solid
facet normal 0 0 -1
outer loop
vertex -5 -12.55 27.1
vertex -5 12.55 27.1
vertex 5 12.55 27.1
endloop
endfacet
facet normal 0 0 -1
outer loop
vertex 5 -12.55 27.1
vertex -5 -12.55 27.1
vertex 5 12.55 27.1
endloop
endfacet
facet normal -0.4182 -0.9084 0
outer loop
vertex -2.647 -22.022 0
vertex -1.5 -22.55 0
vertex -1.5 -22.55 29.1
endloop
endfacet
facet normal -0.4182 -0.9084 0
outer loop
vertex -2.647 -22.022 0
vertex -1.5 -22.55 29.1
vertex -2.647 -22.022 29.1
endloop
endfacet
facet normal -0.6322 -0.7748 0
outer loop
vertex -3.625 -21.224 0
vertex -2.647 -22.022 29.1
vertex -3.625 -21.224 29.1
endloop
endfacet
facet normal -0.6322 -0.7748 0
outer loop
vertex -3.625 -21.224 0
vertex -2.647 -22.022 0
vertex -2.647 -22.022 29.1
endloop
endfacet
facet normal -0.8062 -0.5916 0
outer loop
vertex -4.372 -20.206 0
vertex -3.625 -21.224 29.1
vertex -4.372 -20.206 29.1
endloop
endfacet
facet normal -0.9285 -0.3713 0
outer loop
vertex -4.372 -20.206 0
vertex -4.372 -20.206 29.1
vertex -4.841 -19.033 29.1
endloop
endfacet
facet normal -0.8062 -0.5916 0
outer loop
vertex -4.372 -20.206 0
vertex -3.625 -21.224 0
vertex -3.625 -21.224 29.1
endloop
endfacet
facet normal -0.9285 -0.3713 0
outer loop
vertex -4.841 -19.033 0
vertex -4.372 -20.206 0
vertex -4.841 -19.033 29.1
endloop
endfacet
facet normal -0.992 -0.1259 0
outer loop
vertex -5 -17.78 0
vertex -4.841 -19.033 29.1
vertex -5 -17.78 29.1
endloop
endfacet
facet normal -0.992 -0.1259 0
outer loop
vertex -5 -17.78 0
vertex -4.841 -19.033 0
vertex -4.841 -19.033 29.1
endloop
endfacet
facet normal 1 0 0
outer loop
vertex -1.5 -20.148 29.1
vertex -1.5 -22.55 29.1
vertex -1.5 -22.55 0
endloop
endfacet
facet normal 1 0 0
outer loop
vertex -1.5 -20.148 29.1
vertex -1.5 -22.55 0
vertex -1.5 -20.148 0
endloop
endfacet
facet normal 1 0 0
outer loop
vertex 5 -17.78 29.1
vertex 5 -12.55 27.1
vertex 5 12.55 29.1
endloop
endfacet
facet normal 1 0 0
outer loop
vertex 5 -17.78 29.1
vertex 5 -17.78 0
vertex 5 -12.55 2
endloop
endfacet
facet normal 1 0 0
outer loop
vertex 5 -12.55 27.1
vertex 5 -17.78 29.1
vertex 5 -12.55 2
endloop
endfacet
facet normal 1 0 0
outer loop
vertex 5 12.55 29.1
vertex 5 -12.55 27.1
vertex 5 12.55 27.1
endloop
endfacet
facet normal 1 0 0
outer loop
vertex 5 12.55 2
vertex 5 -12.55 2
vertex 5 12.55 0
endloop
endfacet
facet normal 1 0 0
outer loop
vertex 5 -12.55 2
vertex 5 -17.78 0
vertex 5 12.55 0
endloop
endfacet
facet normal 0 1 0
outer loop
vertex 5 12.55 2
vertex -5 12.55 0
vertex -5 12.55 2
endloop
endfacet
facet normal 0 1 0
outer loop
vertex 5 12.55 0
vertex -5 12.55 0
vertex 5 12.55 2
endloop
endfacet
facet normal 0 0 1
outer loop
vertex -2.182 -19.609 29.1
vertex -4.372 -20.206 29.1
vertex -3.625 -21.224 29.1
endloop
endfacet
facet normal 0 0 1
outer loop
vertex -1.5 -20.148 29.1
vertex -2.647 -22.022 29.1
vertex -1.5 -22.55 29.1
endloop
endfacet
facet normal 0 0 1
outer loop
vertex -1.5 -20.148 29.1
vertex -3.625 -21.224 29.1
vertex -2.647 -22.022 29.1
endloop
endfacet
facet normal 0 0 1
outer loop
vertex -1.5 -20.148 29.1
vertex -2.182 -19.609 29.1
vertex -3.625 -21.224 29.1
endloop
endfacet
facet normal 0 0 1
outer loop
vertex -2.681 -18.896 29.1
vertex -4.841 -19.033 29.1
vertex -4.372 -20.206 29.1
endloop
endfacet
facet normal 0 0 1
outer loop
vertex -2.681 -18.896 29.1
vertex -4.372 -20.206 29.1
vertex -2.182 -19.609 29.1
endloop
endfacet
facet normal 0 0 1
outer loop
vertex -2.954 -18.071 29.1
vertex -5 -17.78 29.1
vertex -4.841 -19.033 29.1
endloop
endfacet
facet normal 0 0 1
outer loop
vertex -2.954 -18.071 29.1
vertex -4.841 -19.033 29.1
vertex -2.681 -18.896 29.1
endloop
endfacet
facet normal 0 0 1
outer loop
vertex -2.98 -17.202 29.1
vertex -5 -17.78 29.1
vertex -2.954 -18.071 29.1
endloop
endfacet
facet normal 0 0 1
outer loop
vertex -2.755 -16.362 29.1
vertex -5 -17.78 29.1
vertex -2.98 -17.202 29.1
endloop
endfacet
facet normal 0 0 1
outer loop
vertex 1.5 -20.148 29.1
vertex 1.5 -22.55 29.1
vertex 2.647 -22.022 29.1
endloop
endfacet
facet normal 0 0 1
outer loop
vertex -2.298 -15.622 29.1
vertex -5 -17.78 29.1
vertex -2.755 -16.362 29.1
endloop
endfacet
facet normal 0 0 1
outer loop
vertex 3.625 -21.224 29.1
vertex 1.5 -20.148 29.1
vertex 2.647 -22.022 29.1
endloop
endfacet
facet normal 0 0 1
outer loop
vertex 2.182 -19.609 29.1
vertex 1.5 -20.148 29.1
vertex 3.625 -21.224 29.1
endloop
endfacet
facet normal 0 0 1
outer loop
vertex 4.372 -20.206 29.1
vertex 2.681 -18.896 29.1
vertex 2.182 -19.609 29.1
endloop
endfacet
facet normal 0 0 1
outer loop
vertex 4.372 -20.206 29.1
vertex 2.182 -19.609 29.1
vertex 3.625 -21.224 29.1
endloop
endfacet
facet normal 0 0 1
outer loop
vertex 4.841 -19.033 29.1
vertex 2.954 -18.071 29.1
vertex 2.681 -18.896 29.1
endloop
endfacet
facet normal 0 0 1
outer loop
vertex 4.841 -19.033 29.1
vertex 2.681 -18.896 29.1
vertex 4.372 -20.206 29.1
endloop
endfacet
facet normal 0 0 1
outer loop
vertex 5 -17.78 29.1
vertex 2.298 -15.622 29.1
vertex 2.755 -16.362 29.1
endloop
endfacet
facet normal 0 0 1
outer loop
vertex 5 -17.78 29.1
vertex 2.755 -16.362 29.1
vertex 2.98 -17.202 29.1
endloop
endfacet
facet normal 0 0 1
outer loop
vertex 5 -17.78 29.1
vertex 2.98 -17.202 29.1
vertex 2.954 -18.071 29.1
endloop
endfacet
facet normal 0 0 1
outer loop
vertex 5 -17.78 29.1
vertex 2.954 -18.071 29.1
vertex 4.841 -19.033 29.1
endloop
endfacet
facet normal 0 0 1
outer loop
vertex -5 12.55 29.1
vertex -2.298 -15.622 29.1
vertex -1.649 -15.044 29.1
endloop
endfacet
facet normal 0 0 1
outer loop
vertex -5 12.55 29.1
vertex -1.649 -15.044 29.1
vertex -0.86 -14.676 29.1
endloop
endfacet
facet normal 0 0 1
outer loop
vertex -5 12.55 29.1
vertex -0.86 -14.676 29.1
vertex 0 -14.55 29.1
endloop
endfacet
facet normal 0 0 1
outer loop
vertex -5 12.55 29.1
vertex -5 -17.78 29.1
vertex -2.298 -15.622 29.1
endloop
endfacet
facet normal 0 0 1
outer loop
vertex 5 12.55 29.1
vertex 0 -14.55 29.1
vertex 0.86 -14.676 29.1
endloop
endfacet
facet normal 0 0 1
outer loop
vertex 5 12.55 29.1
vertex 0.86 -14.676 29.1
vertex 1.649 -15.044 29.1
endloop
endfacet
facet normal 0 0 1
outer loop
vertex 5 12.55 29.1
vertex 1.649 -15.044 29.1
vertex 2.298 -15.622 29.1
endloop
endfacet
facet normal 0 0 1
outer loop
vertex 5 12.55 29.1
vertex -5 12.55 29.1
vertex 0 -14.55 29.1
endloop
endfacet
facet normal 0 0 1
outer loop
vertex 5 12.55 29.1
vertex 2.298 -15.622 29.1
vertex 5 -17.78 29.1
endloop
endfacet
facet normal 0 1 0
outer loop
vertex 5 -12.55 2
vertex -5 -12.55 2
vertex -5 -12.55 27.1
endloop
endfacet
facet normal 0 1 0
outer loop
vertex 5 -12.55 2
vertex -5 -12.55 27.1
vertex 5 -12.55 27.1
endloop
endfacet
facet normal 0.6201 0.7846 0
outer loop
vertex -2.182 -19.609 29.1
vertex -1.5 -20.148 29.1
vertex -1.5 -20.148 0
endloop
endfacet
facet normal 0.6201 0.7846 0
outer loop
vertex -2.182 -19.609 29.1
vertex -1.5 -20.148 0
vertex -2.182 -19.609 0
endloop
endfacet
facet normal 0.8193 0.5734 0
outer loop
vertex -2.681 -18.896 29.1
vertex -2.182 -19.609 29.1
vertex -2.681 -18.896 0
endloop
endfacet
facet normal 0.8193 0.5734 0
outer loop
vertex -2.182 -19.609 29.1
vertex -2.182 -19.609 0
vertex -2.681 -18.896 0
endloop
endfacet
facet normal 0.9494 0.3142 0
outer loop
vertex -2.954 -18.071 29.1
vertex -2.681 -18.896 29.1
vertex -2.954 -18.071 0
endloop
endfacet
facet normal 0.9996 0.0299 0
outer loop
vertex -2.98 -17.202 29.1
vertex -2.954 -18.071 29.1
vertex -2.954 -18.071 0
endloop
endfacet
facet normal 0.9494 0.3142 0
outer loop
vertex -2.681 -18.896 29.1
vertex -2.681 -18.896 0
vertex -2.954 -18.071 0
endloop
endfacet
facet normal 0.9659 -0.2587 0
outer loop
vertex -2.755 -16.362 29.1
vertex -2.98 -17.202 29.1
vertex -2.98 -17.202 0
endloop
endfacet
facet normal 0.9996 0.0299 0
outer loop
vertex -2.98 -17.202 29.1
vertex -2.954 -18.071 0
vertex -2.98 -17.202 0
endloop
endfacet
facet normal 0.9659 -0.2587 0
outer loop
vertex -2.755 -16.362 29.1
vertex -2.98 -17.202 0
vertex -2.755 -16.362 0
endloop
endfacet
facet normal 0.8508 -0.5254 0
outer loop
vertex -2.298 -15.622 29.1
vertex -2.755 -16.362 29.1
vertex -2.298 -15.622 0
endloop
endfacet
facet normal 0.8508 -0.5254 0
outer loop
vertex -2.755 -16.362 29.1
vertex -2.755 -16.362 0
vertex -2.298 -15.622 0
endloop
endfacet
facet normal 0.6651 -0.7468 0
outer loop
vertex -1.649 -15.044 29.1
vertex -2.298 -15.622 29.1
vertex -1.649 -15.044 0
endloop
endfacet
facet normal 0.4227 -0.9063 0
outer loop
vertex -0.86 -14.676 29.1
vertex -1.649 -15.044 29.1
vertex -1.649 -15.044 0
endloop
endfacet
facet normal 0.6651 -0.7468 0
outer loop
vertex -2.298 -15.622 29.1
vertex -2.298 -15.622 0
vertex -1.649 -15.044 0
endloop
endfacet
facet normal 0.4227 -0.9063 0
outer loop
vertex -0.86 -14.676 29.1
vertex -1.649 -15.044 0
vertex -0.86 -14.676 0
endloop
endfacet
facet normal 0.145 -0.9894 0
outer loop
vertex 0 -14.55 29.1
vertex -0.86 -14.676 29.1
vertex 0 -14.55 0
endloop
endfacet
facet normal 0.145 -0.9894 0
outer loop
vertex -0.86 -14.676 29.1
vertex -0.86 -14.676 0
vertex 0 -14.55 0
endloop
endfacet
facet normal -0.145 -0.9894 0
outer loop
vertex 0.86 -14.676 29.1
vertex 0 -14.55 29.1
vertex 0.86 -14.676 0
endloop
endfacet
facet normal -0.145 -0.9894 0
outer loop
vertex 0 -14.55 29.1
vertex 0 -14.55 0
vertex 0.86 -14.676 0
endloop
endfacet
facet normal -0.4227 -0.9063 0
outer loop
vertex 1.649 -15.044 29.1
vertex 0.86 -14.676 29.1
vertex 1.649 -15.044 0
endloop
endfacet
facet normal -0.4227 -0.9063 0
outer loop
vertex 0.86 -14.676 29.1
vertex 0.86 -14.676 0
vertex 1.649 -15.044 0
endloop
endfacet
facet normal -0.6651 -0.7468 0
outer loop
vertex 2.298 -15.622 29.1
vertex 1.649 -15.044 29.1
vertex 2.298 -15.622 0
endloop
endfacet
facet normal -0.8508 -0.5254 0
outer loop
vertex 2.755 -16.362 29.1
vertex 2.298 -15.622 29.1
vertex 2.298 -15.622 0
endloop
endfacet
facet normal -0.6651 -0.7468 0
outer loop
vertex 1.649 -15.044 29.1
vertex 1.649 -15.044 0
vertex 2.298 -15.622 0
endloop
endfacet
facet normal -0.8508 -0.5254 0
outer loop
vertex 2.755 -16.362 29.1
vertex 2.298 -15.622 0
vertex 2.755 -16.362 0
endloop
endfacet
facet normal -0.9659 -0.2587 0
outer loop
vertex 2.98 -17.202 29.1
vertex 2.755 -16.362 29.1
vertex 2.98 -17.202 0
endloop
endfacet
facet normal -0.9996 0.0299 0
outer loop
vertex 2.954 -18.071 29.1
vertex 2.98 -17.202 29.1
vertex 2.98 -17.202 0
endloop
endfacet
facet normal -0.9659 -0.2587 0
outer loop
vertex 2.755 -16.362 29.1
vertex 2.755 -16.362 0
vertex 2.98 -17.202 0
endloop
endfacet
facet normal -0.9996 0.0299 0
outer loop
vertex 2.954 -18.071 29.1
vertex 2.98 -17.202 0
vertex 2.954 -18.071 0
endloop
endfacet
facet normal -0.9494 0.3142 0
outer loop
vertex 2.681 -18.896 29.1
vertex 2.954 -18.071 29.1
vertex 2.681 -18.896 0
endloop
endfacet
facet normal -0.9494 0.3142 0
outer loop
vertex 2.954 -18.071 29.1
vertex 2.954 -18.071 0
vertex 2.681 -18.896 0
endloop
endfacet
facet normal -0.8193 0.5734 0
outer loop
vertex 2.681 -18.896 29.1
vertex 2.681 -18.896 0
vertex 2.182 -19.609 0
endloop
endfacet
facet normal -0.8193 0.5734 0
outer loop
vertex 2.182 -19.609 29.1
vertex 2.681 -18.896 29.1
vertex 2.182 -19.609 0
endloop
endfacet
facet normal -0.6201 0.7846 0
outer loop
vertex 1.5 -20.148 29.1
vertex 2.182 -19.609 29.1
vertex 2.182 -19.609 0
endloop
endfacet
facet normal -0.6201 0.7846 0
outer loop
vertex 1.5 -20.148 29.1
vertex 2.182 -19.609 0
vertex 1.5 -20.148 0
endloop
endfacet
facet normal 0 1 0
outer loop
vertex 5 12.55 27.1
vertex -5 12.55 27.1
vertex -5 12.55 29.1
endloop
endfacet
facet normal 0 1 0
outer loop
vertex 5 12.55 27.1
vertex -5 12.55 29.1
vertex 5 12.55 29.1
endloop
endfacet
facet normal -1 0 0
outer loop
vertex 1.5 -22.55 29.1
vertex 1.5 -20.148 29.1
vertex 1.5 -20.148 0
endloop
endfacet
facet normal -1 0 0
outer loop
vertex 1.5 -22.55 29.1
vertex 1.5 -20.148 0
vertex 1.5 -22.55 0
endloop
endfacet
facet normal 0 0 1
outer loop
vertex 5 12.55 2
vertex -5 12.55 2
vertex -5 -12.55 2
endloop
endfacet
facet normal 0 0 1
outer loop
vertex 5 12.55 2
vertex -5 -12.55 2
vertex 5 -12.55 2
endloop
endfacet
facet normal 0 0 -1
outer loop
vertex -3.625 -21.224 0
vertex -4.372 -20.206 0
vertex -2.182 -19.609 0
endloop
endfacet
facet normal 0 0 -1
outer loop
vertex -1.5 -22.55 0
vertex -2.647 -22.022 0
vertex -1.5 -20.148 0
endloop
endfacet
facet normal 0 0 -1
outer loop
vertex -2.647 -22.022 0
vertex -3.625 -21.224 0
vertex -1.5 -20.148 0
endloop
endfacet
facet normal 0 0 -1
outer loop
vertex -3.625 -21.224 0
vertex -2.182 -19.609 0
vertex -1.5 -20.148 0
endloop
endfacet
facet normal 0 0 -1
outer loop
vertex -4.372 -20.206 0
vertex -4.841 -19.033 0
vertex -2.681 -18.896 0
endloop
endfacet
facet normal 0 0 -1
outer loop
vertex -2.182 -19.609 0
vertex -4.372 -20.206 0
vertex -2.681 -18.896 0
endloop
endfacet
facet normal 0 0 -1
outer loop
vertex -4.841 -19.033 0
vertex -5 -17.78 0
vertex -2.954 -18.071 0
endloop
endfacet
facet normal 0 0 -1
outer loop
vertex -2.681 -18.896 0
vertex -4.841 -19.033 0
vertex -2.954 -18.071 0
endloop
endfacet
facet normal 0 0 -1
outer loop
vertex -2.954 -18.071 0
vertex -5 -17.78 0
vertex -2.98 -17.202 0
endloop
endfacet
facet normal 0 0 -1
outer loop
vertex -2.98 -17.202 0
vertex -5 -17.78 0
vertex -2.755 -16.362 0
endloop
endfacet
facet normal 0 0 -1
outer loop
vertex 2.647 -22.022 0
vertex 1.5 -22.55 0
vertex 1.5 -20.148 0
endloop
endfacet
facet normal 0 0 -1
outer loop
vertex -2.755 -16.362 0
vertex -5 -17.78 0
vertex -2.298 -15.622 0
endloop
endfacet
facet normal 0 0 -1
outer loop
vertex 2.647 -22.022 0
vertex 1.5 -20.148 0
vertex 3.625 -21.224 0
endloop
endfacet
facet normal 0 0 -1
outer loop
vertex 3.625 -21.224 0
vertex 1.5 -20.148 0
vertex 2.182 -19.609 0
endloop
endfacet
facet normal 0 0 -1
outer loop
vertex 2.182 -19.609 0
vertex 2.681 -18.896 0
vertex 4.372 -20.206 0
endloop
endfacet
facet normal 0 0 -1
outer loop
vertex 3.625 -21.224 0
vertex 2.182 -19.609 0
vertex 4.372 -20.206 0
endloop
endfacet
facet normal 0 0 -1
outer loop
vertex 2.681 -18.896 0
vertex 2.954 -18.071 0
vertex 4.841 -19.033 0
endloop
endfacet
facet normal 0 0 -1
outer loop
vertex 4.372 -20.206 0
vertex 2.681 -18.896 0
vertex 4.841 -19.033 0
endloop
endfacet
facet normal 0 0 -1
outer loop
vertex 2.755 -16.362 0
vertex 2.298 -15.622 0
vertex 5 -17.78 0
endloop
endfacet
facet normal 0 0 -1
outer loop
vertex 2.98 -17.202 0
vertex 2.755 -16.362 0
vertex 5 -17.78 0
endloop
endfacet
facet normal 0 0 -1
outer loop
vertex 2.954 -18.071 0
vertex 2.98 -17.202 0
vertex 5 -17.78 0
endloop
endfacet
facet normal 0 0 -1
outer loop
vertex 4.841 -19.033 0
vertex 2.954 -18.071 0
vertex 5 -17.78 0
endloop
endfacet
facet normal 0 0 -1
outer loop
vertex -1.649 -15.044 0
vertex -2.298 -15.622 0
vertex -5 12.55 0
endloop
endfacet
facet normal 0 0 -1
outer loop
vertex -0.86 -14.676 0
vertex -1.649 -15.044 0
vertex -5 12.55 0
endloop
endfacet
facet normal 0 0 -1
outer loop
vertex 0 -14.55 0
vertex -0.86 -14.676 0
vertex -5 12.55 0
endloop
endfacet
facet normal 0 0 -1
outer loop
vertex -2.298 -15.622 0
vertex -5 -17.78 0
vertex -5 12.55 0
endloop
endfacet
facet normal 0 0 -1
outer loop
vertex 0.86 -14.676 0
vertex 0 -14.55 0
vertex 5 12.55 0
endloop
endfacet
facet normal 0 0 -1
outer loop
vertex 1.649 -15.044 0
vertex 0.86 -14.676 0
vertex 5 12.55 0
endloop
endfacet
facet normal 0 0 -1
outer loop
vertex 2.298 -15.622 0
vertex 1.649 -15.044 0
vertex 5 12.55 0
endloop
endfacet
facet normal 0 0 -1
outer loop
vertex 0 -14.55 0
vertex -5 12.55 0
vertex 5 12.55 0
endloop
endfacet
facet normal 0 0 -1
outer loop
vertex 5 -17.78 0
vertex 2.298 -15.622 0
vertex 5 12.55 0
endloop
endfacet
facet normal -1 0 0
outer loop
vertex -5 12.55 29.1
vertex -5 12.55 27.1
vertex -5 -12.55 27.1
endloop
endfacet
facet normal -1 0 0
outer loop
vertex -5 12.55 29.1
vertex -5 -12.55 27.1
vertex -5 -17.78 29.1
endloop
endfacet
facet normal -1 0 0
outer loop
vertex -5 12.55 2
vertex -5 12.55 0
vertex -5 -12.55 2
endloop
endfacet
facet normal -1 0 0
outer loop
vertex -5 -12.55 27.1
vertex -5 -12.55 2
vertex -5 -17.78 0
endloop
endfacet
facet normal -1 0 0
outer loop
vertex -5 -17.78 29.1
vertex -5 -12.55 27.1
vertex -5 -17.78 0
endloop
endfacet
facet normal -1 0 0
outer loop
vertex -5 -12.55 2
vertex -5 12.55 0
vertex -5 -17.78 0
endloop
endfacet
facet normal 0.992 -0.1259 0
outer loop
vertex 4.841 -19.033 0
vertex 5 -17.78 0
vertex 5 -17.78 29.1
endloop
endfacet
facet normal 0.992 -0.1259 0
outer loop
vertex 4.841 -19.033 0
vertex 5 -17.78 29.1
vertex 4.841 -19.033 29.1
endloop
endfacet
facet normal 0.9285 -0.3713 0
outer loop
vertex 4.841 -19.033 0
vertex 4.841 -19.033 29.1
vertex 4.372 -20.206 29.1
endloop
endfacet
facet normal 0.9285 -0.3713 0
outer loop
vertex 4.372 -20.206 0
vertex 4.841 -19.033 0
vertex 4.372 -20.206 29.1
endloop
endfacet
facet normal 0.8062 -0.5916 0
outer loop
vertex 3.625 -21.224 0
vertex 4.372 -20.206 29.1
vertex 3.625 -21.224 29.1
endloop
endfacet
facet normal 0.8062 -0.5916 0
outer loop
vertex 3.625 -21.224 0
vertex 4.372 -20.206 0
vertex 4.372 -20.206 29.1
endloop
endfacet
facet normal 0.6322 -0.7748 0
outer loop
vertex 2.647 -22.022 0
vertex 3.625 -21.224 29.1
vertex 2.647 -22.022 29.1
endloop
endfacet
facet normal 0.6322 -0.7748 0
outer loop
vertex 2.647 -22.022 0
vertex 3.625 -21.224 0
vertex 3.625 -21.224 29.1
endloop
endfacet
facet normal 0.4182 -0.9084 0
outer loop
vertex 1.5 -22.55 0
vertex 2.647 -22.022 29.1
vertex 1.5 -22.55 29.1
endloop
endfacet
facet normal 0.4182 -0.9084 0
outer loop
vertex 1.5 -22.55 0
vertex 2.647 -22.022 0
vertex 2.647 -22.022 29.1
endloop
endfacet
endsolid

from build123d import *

# Parameters (mm, degrees)
F3_W        = 10
F3_H        = 25.1
F4_DEPTH    = 29.1
F5_DEPTH    = 27.1
F6_DEPTH    = 2
F7_T1_DEPTH = 52.9484800354


# Not quite as in the source:
# - a fillet or chamfer that OpenCascade refuses, or shapes differently, is made with other operations: its cross-section is extruded or revolved along the edge and cut away or added


with BuildPart() as f4:
    # F3 (on Top) → F4 (new body)
    with BuildSketch(Plane.XY):
        Rectangle(F3_W, F3_H)
        with BuildLine():
            Line((5, -12.55), (-5, -12.55))
            Line((-5, -12.55), (-5, -22.55))
            Line((-5, -22.55), (-1.5, -22.55))
            Line((-1.5, -22.55), (-1.5, -20.1480762114))
            ThreePointArc((-1.5, -20.1480762114), (0, -14.55), (1.5, -20.1480762114))
            Line((1.5, -20.1480762114), (1.5, -22.55))
            Line((1.5, -22.55), (5, -22.55))
            Line((5, -22.55), (5, -12.55))
        make_face()
    extrude(amount=F4_DEPTH)

    # F3 (on Top) → F5 (cut)
    with BuildSketch(Plane.XY):
        Rectangle(F3_W, F3_H)
    extrude(amount=F5_DEPTH, mode=Mode.SUBTRACT)

    # F3 (on Top) → F6 (join)
    with BuildSketch(Plane.XY):
        Rectangle(F3_W, F3_H)
        with BuildLine():
            Line((5, -12.55), (-5, -12.55))
            Line((-5, -12.55), (-5, -22.55))
            Line((-5, -22.55), (-1.5, -22.55))
            Line((-1.5, -22.55), (-1.5, -20.1480762114))
            ThreePointArc((-1.5, -20.1480762114), (0, -14.55), (1.5, -20.1480762114))
            Line((1.5, -20.1480762114), (1.5, -22.55))
            Line((1.5, -22.55), (5, -22.55))
            Line((5, -22.55), (5, -12.55))
        make_face()
    extrude(amount=F6_DEPTH)

    # F7: fillet of radius 5 on 2 edges, made by hand

    # F7_s2 → F7_t1 (cut)
    with BuildSketch(Plane.XY.offset(-11.9242400177)):
        with BuildLine():
            ThreePointArc((-1.5, -22.55), (-4.0311288741, -20.7383438845), (-5, -17.7803039929))
            Line((-5, -17.7803039929), (-5, -22.55))
            Line((-5, -22.55), (-1.5, -22.55))
        make_face()
        with BuildLine():
            ThreePointArc((5, -17.7803039929), (4.0311288741, -20.7383438845), (1.5, -22.55))
            Line((1.5, -22.55), (5, -22.55))
            Line((5, -22.55), (5, -17.7803039929))
        make_face()
    extrude(amount=F7_T1_DEPTH, mode=Mode.SUBTRACT)


solid = f4.part
